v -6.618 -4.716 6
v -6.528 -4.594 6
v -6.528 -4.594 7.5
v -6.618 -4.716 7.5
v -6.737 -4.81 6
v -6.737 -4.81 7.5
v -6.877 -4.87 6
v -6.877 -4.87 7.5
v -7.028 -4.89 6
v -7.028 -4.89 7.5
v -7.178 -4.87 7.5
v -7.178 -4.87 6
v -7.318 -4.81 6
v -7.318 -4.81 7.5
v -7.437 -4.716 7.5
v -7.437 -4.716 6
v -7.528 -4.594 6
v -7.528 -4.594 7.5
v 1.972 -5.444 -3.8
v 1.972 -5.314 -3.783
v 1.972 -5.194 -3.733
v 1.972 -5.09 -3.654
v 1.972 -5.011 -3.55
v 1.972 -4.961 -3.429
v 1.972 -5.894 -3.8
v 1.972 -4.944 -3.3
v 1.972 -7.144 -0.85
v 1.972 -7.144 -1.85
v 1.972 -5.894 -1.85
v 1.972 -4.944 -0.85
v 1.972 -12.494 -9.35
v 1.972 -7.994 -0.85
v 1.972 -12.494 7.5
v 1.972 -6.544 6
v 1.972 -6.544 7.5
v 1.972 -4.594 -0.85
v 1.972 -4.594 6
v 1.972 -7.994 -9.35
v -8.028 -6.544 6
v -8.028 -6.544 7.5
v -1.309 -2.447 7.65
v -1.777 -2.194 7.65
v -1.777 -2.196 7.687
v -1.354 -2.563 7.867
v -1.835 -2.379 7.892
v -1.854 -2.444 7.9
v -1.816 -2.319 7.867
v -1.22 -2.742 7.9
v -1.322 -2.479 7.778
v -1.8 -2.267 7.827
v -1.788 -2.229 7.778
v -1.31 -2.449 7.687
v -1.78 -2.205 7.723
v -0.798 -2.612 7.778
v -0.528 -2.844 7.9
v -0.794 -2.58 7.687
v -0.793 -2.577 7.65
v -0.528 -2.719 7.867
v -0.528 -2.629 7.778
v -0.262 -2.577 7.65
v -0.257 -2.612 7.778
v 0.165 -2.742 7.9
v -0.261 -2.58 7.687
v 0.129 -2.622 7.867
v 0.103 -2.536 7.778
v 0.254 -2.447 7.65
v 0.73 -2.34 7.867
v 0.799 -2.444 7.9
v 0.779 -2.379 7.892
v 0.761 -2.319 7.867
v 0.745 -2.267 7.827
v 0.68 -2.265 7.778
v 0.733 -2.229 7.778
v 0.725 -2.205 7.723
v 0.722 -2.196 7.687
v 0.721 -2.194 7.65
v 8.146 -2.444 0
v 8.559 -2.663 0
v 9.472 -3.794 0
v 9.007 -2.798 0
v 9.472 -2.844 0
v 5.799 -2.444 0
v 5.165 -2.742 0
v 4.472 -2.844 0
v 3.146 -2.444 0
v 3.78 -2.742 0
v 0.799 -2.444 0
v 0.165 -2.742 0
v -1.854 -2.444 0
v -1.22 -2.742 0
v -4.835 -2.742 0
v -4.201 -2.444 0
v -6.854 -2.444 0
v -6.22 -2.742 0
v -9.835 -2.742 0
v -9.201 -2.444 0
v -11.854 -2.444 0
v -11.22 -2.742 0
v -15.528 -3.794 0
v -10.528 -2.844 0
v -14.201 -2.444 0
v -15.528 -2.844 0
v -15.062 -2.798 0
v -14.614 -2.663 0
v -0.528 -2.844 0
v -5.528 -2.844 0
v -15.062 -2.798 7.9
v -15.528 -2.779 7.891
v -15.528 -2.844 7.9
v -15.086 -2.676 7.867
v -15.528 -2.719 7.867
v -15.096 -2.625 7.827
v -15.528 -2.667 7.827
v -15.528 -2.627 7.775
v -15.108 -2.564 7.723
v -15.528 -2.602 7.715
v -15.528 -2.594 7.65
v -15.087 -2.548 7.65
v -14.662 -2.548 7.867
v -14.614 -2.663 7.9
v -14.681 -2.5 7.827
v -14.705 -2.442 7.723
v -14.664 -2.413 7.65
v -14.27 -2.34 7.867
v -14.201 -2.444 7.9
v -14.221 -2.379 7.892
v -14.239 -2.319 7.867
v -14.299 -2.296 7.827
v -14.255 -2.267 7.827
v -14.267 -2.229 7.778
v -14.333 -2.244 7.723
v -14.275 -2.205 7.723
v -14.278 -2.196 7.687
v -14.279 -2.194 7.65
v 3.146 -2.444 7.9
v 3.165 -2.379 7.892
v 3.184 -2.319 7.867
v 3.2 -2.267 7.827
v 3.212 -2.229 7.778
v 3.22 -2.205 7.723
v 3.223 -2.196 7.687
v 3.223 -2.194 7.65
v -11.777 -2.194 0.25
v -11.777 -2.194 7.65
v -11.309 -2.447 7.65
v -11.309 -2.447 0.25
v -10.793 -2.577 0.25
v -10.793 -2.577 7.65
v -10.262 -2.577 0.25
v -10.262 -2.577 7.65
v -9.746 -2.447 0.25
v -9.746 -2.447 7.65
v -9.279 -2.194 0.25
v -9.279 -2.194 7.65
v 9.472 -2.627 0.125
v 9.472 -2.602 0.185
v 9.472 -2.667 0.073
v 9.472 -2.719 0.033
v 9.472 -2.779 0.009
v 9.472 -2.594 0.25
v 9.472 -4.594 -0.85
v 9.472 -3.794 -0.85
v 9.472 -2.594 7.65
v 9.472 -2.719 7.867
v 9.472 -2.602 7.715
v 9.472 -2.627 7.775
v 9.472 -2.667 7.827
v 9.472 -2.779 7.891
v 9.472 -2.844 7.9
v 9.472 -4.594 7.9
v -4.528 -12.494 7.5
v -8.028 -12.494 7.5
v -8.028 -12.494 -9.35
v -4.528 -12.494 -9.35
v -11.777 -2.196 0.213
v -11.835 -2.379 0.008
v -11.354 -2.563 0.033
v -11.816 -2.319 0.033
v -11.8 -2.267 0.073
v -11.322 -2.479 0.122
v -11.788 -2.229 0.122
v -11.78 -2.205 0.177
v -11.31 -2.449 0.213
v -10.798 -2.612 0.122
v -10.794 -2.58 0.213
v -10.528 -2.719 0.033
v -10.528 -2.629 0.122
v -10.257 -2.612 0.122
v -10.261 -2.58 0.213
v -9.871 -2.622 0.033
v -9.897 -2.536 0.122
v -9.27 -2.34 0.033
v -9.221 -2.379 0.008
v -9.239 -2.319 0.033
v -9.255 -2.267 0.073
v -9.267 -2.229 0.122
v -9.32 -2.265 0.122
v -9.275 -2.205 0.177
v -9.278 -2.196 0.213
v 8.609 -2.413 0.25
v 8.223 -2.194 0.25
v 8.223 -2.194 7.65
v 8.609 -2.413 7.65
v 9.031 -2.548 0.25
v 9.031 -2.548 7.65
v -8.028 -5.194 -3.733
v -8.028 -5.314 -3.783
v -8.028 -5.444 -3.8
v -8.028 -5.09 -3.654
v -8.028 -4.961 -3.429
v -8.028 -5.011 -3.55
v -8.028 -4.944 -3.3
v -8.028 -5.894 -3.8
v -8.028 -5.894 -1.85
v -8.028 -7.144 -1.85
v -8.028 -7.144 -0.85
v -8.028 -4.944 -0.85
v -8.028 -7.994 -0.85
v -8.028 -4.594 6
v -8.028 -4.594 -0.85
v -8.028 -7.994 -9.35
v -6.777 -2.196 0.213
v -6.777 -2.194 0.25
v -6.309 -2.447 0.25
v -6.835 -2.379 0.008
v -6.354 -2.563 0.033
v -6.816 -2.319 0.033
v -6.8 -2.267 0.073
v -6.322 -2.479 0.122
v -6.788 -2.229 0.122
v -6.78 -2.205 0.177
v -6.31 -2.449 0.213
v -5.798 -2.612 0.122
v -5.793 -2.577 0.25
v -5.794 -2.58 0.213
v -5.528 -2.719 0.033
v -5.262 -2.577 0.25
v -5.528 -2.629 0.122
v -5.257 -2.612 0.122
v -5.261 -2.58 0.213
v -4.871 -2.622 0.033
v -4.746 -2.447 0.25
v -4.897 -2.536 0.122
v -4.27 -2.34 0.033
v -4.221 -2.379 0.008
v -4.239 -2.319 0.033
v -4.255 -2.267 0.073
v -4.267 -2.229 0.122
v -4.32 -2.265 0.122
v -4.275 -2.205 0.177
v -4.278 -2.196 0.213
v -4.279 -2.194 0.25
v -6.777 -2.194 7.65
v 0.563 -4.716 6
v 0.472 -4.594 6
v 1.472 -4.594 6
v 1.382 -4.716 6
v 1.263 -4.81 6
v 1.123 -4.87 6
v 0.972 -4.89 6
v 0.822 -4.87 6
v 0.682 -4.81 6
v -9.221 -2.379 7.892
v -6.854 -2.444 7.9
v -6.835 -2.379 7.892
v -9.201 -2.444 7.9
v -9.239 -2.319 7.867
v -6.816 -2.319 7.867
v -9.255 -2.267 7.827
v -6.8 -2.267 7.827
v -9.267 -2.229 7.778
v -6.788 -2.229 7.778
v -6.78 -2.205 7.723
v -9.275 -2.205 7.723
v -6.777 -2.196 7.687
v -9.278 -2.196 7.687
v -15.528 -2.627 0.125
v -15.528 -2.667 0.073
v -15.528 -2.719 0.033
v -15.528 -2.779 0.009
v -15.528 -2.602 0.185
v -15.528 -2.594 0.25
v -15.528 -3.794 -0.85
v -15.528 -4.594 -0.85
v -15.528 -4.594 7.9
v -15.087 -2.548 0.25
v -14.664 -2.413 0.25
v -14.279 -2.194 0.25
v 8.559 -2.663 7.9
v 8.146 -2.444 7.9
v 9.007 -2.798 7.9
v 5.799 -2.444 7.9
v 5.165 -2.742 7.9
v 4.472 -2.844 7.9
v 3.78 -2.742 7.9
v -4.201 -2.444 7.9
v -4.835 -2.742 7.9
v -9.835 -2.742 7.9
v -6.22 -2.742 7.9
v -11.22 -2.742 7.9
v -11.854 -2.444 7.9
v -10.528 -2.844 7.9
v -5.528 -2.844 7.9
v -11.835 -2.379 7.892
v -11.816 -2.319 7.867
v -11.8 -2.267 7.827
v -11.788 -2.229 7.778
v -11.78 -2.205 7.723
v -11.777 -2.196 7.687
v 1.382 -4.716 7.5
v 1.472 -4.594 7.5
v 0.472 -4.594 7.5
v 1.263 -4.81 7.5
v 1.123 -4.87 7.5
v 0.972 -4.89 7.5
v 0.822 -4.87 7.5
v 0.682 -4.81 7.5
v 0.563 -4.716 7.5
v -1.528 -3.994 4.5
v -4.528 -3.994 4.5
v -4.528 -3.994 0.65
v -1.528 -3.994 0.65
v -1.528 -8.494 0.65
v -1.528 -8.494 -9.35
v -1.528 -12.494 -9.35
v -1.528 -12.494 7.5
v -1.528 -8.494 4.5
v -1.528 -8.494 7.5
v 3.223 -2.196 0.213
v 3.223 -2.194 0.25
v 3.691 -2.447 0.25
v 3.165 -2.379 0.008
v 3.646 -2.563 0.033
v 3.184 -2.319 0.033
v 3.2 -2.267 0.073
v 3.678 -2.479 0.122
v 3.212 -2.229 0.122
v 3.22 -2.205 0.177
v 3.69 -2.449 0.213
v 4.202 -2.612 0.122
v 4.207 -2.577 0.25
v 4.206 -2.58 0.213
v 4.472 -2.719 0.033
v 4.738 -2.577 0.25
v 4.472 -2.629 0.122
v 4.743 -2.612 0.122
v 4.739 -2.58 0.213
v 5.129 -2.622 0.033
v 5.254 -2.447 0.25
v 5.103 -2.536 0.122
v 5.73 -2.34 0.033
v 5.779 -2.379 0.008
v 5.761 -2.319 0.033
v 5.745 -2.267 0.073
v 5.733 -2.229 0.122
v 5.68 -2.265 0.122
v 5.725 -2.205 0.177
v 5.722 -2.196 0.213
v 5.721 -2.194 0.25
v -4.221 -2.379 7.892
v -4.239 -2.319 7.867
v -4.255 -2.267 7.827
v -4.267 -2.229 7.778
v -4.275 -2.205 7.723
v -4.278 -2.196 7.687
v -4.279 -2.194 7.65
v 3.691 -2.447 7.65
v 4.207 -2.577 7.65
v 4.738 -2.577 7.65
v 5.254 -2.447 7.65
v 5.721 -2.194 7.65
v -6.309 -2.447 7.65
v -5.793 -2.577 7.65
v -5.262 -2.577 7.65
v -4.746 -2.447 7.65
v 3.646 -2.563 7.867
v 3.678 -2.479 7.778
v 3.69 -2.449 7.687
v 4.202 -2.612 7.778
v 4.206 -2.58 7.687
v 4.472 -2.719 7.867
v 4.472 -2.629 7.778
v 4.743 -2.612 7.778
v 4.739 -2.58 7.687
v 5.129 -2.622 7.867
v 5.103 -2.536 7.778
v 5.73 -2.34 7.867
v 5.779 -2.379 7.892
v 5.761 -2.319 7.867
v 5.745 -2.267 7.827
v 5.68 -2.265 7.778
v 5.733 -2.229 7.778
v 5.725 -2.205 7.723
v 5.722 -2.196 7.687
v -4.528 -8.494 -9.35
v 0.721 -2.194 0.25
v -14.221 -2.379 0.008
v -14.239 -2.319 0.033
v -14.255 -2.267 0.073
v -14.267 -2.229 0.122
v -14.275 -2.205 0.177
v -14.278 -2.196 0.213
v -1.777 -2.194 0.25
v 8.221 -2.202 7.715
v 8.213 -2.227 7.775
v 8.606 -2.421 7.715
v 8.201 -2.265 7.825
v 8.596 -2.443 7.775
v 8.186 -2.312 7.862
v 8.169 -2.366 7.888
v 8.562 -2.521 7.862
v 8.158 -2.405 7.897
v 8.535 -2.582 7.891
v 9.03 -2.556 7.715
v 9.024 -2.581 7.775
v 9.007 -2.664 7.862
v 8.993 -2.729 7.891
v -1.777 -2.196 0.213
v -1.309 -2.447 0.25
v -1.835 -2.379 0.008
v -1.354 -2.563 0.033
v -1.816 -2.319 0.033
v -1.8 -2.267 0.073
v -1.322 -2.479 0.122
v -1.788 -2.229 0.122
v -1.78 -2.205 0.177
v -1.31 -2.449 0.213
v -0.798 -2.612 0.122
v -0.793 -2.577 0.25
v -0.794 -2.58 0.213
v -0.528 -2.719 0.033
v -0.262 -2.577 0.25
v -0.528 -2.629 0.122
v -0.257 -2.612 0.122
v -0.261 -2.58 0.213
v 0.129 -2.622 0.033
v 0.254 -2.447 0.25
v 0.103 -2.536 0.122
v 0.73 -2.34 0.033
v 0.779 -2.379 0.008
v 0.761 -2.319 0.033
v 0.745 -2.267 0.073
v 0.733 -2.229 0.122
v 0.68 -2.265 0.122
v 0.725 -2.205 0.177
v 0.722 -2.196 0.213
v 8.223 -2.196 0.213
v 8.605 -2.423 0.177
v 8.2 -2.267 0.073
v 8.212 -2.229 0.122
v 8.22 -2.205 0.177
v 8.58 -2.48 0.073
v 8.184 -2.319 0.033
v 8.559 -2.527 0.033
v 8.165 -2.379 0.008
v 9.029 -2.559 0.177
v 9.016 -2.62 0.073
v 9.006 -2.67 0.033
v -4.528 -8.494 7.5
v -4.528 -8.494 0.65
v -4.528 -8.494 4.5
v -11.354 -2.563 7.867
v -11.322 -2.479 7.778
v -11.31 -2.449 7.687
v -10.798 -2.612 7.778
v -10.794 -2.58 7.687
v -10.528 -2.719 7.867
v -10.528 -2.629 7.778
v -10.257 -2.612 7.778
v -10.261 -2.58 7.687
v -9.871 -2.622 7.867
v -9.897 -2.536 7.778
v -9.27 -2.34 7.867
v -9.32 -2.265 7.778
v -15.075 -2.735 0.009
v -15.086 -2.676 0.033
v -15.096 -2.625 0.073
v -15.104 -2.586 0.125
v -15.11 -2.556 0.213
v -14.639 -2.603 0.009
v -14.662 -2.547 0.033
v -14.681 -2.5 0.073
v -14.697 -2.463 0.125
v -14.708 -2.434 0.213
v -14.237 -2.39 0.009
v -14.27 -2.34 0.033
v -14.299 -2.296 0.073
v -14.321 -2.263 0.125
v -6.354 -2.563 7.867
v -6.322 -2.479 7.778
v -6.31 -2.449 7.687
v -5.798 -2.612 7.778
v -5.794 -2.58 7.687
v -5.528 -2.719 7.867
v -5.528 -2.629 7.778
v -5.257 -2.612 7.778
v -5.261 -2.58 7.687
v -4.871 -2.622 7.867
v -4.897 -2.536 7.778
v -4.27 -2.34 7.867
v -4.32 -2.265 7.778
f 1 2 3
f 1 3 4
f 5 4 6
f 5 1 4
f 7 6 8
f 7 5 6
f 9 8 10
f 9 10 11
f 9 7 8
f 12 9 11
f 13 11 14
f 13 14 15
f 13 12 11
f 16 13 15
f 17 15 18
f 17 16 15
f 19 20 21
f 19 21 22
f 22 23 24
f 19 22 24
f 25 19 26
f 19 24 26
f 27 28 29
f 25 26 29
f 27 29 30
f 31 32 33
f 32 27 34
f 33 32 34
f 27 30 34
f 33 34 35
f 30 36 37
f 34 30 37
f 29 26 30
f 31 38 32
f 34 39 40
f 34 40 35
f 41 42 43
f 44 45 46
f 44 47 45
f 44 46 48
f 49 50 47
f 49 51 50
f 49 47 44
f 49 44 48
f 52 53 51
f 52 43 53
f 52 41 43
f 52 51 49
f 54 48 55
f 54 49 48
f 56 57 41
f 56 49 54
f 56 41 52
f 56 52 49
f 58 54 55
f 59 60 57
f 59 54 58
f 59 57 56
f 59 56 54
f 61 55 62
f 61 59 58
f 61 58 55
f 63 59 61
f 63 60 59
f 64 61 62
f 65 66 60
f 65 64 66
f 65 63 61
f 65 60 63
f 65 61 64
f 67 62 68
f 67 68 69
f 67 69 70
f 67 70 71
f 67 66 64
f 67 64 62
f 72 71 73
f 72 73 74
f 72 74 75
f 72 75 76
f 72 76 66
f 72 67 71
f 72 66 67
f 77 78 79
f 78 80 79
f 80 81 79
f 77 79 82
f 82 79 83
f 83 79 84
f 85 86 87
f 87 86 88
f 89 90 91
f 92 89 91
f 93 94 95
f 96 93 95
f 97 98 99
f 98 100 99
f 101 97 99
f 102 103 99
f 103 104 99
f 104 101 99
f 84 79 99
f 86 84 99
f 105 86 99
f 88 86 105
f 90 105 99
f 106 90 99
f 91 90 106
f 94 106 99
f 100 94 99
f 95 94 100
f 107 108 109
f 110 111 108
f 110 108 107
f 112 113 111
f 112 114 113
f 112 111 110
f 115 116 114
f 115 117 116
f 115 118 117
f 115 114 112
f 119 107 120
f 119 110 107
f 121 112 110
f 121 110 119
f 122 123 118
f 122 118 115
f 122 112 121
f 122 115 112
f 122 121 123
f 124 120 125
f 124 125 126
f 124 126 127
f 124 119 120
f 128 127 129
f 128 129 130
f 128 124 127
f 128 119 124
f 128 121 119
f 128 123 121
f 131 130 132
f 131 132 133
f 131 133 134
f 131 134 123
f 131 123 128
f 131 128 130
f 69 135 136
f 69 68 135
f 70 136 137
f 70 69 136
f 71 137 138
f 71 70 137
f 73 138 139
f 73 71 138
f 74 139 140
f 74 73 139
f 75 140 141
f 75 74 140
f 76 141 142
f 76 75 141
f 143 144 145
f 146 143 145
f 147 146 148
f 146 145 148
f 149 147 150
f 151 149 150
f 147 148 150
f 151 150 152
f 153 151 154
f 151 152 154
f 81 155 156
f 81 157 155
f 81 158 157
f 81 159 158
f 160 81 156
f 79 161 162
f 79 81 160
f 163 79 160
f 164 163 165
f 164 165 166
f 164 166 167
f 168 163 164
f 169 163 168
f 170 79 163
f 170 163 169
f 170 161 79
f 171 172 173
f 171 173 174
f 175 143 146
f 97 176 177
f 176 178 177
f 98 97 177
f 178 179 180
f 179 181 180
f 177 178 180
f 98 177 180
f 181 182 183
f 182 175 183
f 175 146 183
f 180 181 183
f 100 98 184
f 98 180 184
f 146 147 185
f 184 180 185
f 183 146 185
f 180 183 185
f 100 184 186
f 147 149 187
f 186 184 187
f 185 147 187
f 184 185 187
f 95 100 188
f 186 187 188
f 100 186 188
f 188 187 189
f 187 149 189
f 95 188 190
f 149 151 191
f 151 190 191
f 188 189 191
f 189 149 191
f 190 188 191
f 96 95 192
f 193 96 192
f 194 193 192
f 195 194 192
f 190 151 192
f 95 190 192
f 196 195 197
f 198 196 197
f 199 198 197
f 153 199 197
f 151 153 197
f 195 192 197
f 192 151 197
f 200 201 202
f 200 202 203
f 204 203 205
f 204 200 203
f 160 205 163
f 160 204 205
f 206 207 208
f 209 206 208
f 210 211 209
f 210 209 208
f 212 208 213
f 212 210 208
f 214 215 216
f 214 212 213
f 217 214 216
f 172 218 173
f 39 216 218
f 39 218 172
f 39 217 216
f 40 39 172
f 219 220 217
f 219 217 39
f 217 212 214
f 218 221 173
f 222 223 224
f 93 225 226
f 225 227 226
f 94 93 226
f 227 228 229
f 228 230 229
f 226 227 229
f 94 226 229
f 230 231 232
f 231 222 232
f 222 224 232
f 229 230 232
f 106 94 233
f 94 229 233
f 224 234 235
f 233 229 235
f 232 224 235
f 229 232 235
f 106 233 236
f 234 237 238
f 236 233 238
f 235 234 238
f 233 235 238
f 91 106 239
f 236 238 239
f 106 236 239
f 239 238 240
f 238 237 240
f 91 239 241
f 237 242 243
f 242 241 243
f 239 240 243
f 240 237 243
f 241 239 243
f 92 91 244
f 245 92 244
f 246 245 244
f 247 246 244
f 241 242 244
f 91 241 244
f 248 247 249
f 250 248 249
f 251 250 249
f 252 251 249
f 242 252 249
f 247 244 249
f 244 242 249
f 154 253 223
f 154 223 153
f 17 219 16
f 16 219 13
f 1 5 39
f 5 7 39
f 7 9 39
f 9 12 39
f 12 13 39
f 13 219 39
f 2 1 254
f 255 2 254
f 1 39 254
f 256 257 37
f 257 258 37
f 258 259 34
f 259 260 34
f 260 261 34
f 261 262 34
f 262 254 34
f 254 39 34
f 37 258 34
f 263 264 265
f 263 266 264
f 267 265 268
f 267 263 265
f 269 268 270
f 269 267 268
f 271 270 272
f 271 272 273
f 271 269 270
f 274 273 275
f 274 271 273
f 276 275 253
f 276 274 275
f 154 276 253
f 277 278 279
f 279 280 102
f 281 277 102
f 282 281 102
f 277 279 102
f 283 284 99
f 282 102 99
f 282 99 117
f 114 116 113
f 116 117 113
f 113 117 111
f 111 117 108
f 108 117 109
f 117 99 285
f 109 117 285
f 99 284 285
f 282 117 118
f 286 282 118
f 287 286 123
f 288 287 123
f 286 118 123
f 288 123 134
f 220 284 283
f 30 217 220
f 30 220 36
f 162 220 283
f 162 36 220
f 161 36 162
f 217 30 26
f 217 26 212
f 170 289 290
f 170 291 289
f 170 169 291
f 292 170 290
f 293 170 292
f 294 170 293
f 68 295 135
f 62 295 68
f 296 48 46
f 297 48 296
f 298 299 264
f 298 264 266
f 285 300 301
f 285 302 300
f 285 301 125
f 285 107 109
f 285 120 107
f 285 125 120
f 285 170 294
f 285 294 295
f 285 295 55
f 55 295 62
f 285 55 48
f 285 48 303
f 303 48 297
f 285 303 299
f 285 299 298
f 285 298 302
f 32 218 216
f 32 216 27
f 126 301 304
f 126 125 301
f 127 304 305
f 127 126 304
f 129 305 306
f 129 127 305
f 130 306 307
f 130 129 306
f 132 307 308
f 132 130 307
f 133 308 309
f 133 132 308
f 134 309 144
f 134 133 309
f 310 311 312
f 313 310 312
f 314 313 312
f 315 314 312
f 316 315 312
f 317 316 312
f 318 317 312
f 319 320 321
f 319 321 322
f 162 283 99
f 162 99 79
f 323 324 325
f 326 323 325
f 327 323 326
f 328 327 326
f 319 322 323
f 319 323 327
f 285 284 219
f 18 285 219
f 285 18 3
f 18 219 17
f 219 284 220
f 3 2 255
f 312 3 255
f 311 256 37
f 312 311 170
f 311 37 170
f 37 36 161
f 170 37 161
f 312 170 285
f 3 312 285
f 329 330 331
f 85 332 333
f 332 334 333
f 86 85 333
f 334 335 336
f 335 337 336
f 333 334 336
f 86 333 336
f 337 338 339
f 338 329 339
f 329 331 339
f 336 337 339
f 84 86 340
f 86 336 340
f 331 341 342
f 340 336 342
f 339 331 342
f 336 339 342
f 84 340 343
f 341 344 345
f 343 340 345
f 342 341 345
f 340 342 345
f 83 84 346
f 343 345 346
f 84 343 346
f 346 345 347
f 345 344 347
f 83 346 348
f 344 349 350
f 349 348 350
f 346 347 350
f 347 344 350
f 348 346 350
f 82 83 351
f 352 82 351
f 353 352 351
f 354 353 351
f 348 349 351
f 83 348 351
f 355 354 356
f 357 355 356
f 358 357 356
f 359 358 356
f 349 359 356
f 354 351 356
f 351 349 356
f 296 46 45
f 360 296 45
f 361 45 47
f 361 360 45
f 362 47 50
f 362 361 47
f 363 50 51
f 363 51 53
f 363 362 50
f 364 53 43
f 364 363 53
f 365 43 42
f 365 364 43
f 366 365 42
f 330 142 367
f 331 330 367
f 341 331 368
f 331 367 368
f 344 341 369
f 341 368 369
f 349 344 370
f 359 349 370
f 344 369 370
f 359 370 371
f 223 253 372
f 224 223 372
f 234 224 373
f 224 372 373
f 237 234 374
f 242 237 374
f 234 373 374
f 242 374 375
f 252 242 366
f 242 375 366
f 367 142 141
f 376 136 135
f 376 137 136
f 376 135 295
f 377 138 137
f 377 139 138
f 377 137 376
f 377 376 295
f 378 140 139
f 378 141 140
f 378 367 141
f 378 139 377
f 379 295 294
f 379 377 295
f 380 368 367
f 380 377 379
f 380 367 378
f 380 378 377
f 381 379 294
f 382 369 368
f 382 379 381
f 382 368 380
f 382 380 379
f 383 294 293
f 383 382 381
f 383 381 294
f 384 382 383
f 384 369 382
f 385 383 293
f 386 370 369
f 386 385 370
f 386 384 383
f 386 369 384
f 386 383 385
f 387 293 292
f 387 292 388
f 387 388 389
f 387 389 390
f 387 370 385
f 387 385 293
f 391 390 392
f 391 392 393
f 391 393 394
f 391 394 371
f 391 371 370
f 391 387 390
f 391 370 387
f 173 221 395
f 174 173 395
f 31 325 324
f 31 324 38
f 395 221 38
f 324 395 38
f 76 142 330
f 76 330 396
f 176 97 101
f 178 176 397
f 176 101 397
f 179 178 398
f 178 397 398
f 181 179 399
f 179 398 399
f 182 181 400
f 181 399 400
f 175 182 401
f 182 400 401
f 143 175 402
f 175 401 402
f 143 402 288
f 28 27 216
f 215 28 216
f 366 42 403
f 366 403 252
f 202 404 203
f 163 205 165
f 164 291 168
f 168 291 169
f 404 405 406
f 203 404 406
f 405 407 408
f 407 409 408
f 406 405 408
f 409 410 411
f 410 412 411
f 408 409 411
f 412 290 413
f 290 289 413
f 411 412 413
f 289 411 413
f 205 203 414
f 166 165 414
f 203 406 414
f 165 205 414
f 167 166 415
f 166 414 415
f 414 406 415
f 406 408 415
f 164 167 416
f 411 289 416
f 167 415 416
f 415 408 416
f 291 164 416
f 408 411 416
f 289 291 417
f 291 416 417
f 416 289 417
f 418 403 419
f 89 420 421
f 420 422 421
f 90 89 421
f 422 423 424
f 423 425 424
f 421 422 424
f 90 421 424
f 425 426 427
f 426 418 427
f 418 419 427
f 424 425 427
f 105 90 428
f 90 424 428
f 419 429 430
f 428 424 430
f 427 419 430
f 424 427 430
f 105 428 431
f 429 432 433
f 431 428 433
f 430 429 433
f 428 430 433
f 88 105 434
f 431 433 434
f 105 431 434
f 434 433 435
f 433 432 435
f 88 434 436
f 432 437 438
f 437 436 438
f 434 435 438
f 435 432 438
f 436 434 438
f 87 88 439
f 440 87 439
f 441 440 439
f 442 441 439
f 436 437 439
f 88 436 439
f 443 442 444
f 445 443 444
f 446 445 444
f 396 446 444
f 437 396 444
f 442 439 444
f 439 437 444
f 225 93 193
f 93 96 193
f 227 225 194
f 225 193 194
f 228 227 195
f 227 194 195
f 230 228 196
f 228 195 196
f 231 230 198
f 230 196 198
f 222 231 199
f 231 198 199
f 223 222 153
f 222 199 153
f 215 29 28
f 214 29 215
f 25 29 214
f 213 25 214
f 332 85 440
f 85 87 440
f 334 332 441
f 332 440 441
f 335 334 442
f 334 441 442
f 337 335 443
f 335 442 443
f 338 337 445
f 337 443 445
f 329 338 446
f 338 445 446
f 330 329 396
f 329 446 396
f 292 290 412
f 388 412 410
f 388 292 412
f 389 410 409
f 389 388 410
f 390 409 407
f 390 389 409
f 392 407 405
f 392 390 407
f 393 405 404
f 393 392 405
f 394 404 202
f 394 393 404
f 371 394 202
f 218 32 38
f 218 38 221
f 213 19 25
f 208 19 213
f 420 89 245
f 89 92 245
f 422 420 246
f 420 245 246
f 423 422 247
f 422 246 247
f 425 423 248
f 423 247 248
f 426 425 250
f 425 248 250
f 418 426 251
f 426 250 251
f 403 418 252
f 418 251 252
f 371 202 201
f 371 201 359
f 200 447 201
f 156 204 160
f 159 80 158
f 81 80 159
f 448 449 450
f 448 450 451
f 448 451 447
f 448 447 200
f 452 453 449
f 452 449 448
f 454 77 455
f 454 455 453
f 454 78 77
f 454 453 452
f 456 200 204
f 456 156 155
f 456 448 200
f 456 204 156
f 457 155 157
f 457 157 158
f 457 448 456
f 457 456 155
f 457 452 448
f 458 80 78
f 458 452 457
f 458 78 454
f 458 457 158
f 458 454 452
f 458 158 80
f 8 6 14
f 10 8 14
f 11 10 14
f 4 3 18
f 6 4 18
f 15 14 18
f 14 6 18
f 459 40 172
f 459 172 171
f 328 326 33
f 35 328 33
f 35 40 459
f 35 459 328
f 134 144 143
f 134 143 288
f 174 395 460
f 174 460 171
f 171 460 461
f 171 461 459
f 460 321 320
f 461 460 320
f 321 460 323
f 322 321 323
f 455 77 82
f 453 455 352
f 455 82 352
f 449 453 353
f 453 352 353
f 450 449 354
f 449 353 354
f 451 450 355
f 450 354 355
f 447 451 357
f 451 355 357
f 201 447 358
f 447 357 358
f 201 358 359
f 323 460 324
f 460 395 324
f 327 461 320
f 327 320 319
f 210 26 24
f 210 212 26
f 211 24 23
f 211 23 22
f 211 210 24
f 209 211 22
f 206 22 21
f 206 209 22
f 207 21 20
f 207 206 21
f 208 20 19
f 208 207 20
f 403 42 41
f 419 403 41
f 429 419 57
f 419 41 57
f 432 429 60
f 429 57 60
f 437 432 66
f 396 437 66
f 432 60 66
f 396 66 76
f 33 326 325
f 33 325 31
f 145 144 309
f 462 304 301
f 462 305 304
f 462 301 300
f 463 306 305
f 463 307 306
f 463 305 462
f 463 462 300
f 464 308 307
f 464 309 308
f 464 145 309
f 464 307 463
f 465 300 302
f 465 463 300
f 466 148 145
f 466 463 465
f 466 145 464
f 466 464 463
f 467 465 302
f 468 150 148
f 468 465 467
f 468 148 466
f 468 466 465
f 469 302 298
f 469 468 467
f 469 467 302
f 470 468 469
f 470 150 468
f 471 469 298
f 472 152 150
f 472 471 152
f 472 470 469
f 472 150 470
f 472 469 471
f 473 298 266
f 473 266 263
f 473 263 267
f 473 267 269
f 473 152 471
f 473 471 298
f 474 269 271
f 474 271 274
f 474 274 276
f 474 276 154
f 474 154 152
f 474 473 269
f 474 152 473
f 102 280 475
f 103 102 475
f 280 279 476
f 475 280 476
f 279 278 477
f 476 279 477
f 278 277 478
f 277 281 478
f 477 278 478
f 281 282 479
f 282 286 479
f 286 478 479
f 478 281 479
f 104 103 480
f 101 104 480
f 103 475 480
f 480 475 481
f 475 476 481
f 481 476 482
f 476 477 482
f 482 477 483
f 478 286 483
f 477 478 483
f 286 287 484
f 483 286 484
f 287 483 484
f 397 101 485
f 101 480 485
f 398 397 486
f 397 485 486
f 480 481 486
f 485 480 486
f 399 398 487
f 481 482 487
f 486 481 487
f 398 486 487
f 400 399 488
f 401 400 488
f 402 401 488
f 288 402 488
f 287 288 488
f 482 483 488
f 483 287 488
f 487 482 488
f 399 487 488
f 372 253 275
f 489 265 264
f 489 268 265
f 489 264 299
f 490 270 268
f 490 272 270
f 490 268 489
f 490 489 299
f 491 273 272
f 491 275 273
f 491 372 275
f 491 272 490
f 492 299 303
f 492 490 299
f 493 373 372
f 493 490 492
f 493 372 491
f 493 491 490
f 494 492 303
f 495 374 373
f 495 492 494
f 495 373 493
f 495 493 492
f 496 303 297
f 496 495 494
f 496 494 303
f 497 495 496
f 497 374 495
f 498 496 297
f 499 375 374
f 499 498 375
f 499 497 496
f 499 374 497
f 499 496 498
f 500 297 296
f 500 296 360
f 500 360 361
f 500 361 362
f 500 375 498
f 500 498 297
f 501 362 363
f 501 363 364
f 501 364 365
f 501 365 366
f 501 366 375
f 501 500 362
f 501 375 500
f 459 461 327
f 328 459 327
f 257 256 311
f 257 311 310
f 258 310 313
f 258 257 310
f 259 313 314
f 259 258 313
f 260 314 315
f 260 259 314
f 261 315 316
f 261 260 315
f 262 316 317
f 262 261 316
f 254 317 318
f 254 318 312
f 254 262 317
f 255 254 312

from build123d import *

# Parameters (mm, degrees)
SKETCH1_W            = 25
SKETCH1_H            = 6.85
BOSS_EXTRUDE1_DEPTH  = 0.8
SKETCH2_W            = 10
SKETCH2_H            = 6.85
BOSS_EXTRUDE2_DEPTH  = 3.9
SKETCH3_W            = 3
SKETCH3_H            = 3.85
CUT_EXTRUDE1_DEPTH   = 4.5
BOSS_EXTRUDE3_DEPTH  = 1.5
SKETCH5_W            = 10
SKETCH5_H            = 2.2
BOSS_EXTRUDE4_DEPTH  = 1
SKETCH6_W            = 25
SKETCH6_H            = 0.8
BOSS_EXTRUDE5_DEPTH  = 0.4
SKETCH7_W            = 25
SKETCH7_H            = 7.9
BOSS_EXTRUDE6_DEPTH  = 1.6
SKETCH8_W            = 10
SKETCH8_H            = 0.95
BOSS_EXTRUDE7_DEPTH  = 1.95
SKETCH9_W            = 10
SKETCH9_H            = 0.5
BOSS_EXTRUDE8_DEPTH  = 8.5
SKETCH10_W           = 10
SKETCH10_H           = 1.95
BOSS_EXTRUDE9_DEPTH  = 1.5
SKETCH11_W           = 3.5
SKETCH11_H           = 16.85
BOSS_EXTRUDE10_DEPTH = 4
SKETCH12_W           = 3.5
SKETCH12_H           = 16.85
BOSS_EXTRUDE11_DEPTH = 4
SKETCH13_W           = 2.15
SKETCH13_H           = 7.9
SKETCH14_W           = 7.9
SKETCH14_H           = 2.15
SKETCH15_W           = 2.15
SKETCH15_H           = 7.9
LPATTERN1_COUNT      = 4
LPATTERN1_PITCH      = 5
FILLET1_R            = 0.5
FILLET2_R            = 0.25
FILLET3_R            = 0.25


with BuildPart() as part:
    # Sketch1 → Boss-Extrude1 (new body)
    with BuildSketch(Plane.XZ.offset(4.593725132)):
        with Locations((-3.027595366, 2.575)):
            Rectangle(SKETCH1_W, SKETCH1_H)
    extrude(amount=-BOSS_EXTRUDE1_DEPTH)

    # Sketch2 → Boss-Extrude2 (add)
    with BuildSketch(Plane.XZ.offset(4.593725132)):
        with Locations((-3.027595366, 2.575)):
            Rectangle(SKETCH2_W, SKETCH2_H)
    extrude(amount=BOSS_EXTRUDE2_DEPTH)

    # Sketch3 → Cut-Extrude1 (cut)
    with BuildSketch(Plane.XZ.offset(8.493725132)):
        with Locations((-3.027595366, 2.575)):
            Rectangle(SKETCH3_W, SKETCH3_H)
    extrude(amount=-CUT_EXTRUDE1_DEPTH, mode=Mode.SUBTRACT)

    # Sketch4 → Boss-Extrude3 (add)
    with BuildSketch(Plane.XY.offset(6)):
        with BuildLine():
            Line((0.472404634, -4.593725132), (-6.527595366, -4.593725132))
            ThreePointArc((-6.527595366, -4.593725132), (-7.027595366, -4.890046488), (-7.527595366, -4.593725132))
            Line((-7.527595366, -4.593725132), (-15.527595366, -4.593725132))
            Line((-15.527595366, -4.593725132), (-15.527595366, -3.793725132))
            Line((-15.527595366, -3.793725132), (9.472404634, -3.793725132))
            Line((9.472404634, -3.793725132), (9.472404634, -4.593725132))
            Line((9.472404634, -4.593725132), (1.472404634, -4.593725132))
            ThreePointArc((1.472404634, -4.593725132), (0.972404634, -4.890046488), (0.472404634, -4.593725132))
        make_face()
    extrude(amount=BOSS_EXTRUDE3_DEPTH)

    # Sketch5 → Boss-Extrude4 (add)
    with BuildSketch(Plane(origin=(0, 0, -0.85), x_dir=(-1, 0, 0), z_dir=(0, 0, -1))):
        with Locations((3.027595366, -6.043725132)):
            Rectangle(SKETCH5_W, SKETCH5_H)
    extrude(amount=BOSS_EXTRUDE4_DEPTH)

    # Sketch6 → Boss-Extrude5 (add)
    with BuildSketch(Plane.XY.offset(7.5)):
        with Locations((-3.027595366, -4.193725132)):
            Rectangle(SKETCH6_W, SKETCH6_H)
    extrude(amount=BOSS_EXTRUDE5_DEPTH)

    # Sketch7 → Boss-Extrude6 (add)
    with BuildSketch(Plane(origin=(0, -3.793725132, 0), x_dir=(-1, 0, 0), z_dir=(0, 1, 0))):
        with Locations((3.027595366, 3.95)):
            Rectangle(SKETCH7_W, SKETCH7_H)
    extrude(amount=BOSS_EXTRUDE6_DEPTH)

    # Sketch8 → Boss-Extrude7 (add)
    with BuildSketch(Plane(origin=(0, 0, -1.85), x_dir=(-1, 0, 0), z_dir=(0, 0, -1))):
        with Locations((3.027595366, -5.418725132)):
            Rectangle(SKETCH8_W, SKETCH8_H)
    extrude(amount=BOSS_EXTRUDE7_DEPTH)

    # Sketch9 → Boss-Extrude8 (add)
    with BuildSketch(Plane(origin=(0, 0, -0.85), x_dir=(-1, 0, 0), z_dir=(0, 0, -1))):
        with Locations((3.027595366, -8.243725132)):
            Rectangle(SKETCH9_W, SKETCH9_H)
    extrude(amount=BOSS_EXTRUDE8_DEPTH)

    # Sketch10 → Boss-Extrude9 (add)
    with BuildSketch(Plane.XY.offset(6)):
        with Locations((-3.027595366, -7.518725132)):
            Rectangle(SKETCH10_W, SKETCH10_H)
    extrude(amount=BOSS_EXTRUDE9_DEPTH)

    # Sketch11 → Boss-Extrude10 (add)
    with BuildSketch(Plane.XZ.offset(8.493725132)):
        with Locations((-6.277595366, -0.925)):
            Rectangle(SKETCH11_W, SKETCH11_H)
    extrude(amount=BOSS_EXTRUDE10_DEPTH)

    # Sketch12 → Boss-Extrude11 (add)
    with BuildSketch(Plane.XZ.offset(8.493725132)):
        with Locations((0.222404634, -0.925)):
            Rectangle(SKETCH12_W, SKETCH12_H)
    extrude(amount=BOSS_EXTRUDE11_DEPTH)

    # Sketch13 → Cut-Revolve1 (revolve, cut)
    with BuildSketch(Plane(origin=(-10.497162294, -7.491972288, 0), x_dir=(-0.5809300463626401, 0.8139534883720941, 0), z_dir=(0.8139534883720941, 0.5809300463626401, 0))):
        with Locations((7.584275077, 3.95)):
            Rectangle(SKETCH13_W, SKETCH13_H)
    revolve(axis=Axis((-15.527595366, -0.443725132, 0), (0, 0, 1)), mode=Mode.SUBTRACT)

    # Sketch14 → Cut-Revolve2 (revolve, cut)
    with BuildSketch(Plane(origin=(9.472404634, 0, 0), x_dir=(0, 0, -1), z_dir=(1, 0, 0))):
        with Locations((-3.95, -1.518725132)):
            Rectangle(SKETCH14_W, SKETCH14_H)
    revolve(axis=Axis((9.472404634, -0.443725132, 0), (0, 0, 1)), mode=Mode.SUBTRACT)

    # Sketch15 → Cut-Revolve3 (revolve, cut)
    with BuildSketch(Plane(origin=(-7.184560888, -5.127722099, 0), x_dir=(-0.5809300463626401, 0.8139534883720941, 0), z_dir=(0.8139534883720941, 0.5809300463626401, 0))):
        with Locations((4.679624845, 3.95)):
            Rectangle(SKETCH15_W, SKETCH15_H)
    cut_revolve3 = revolve(axis=Axis((-10.527595366, -0.443725132, 0), (0, 0, 1)), mode=Mode.SUBTRACT)

    # LPattern1: Cut-Revolve3 ×4
    with Locations(*[(i * LPATTERN1_PITCH, 0, 0) for i in range(1, LPATTERN1_COUNT)]):
        add(cut_revolve3, mode=Mode.SUBTRACT)

    # Fillet1
    fillet1_edges = [part.edges().sort_by_distance(p)[0] for p in [
        (-3.027595366, -4.943725132, -3.8),
    ]]
    fillet(fillet1_edges, radius=FILLET1_R)

    # Fillet2
    fillet2_edges = [part.edges().sort_by_distance(p)[0] for p in [
        (-14.871851514, -2.491284655, 0),
        (-13.027595366, -2.193725132, 0),
        (-10.527595366, -2.593725132, 0),
        (-8.027595366, -2.193725132, 0),
        (-5.527595366, -2.593725132, 0),
        (-3.027595366, -2.193725132, 0),
        (-0.527595366, -2.593725132, 0),
        (8.816660781, -2.491284655, 0),
        (1.972404634, -2.193725132, 0),
        (6.972404634, -2.193725132, 0),
        (4.472404634, -2.593725132, 0),
    ]]
    fillet(fillet2_edges, radius=FILLET2_R)

    # Fillet3
    fillet3_edges = [part.edges().sort_by_distance(p)[0] for p in [
        (8.816660781, -2.491284655, 7.9),
        (6.972404634, -2.193725132, 7.9),
        (4.472404634, -2.593725132, 7.9),
        (-14.871851514, -2.491284655, 7.9),
        (1.972404634, -2.193725132, 7.9),
        (-13.027595366, -2.193725132, 7.9),
        (-0.527595366, -2.593725132, 7.9),
        (-10.527595366, -2.593725132, 7.9),
        (-3.027595366, -2.193725132, 7.9),
        (-8.027595366, -2.193725132, 7.9),
        (-5.527595366, -2.593725132, 7.9),
    ]]
    fillet(fillet3_edges, radius=FILLET3_R)


solid = part.part
